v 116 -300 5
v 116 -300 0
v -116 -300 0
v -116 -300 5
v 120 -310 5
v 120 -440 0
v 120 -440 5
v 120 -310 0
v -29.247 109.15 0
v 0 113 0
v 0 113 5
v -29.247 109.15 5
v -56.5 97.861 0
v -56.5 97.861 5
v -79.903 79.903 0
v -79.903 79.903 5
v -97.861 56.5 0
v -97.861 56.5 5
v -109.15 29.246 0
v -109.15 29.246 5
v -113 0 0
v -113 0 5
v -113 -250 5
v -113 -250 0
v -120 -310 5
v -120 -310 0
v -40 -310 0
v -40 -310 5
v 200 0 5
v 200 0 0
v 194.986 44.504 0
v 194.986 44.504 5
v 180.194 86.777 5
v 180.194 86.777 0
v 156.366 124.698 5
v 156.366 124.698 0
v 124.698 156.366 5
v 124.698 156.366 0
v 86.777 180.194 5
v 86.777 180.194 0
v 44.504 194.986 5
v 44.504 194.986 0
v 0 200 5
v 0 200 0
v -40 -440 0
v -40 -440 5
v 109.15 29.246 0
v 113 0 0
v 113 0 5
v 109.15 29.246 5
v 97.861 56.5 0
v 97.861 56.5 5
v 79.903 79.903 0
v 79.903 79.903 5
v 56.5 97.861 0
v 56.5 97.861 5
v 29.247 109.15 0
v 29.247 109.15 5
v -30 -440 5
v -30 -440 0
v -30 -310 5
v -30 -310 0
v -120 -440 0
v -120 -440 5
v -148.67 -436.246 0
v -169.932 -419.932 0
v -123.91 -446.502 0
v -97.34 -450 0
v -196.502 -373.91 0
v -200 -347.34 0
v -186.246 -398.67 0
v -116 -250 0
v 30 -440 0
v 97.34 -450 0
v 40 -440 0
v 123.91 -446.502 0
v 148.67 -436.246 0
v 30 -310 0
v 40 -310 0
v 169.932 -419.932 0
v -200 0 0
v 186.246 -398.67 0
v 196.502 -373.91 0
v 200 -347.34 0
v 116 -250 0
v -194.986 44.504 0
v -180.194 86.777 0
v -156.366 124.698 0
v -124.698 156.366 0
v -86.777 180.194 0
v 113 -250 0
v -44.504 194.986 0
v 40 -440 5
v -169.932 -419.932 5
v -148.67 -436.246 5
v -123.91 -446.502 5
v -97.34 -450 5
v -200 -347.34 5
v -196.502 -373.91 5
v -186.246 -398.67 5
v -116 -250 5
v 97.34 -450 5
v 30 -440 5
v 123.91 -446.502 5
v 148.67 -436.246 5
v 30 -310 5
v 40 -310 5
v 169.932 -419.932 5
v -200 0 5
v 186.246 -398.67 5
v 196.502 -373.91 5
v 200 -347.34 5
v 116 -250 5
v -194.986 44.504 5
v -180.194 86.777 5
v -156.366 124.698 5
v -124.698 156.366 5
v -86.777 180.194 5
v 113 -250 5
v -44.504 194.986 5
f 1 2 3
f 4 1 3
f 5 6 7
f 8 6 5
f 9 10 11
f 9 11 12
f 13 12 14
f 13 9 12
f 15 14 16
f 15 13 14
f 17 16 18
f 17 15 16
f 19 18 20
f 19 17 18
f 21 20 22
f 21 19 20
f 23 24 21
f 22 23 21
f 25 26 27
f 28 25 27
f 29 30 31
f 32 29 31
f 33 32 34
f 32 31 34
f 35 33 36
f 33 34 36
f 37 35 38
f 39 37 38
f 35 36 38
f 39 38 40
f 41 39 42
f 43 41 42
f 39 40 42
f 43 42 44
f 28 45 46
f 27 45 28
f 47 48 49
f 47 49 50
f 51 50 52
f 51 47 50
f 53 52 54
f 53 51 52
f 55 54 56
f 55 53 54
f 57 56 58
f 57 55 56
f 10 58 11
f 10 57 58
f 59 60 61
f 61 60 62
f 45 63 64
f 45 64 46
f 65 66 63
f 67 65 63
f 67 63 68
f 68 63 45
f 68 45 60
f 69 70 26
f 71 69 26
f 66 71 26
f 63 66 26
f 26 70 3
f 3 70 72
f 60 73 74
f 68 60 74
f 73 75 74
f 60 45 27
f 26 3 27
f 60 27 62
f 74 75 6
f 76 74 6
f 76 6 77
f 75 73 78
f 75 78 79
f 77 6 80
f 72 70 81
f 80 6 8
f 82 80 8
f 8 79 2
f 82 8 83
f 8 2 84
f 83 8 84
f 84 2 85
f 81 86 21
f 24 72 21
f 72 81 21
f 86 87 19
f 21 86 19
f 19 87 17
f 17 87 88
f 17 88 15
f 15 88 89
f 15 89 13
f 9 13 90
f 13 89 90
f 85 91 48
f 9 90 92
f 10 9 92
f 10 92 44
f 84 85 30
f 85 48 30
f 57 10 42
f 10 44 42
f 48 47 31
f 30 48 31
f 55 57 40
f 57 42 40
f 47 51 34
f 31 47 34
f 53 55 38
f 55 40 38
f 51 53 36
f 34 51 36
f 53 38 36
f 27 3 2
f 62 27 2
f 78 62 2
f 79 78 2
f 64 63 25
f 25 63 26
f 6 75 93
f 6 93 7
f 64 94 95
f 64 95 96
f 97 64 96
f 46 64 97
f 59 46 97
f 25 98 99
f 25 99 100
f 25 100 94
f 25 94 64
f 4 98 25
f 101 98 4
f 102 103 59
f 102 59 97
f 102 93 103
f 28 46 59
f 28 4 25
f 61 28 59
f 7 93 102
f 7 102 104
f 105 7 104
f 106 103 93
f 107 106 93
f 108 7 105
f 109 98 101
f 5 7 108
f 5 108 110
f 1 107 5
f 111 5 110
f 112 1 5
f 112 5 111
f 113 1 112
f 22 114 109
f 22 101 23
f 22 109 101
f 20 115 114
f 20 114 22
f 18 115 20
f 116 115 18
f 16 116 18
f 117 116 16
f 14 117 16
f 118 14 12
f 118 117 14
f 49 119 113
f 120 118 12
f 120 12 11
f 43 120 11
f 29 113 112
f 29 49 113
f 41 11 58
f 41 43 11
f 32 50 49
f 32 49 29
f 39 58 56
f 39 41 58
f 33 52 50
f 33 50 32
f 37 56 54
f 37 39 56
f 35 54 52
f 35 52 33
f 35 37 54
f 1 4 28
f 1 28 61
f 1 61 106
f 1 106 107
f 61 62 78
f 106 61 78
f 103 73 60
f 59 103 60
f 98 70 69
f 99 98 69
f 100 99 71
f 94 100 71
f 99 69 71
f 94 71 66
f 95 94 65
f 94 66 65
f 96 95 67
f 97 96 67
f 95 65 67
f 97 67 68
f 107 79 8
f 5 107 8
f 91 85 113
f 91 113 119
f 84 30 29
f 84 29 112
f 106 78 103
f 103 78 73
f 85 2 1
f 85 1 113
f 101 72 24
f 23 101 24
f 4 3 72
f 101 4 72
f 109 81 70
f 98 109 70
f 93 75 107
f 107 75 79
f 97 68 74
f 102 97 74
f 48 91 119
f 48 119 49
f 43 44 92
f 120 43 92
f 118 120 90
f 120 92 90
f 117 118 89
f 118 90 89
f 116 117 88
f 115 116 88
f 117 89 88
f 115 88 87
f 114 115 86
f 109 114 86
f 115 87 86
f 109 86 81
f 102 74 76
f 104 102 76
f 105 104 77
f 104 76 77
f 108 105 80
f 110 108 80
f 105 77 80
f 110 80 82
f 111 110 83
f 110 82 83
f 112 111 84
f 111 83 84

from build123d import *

# Parameters (mm, degrees)
SKETCH_W  = 80
SKETCH_H  = 130
PAD_DEPTH = 5


with BuildPart() as part:
    # Sketch → Pad (new body)
    with BuildSketch(Plane.XY):
        with BuildLine():
            ThreePointArc((200, 3e-06), (141.421355, 141.421357), (0, 200))
            ThreePointArc((0, 200), (-141.421355, 141.421357), (-200, 3e-06))
            Line((-200, 3e-06), (-200, -347.34))
            ThreePointArc((-200, -347.34), (-169.931582, -419.931582), (-97.340001, -450))
            Line((0, -450), (-97.340001, -450))
            Line((0, -450), (97.340001, -450))
            ThreePointArc((97.340001, -450), (169.931582, -419.931582), (200, -347.34))
            Line((200, 3e-06), (200, -347.34))
        make_face()
        with BuildLine():
            Line((0, -300), (116, -300))
            Line((116, -300), (116, -250))
            Line((116, -250), (113, -250))
            Line((113, -250), (113, -0.000123))
            ThreePointArc((113, -0.000123), (79.90311, 79.903023), (0, 113))
            ThreePointArc((0, 113), (-79.90311, 79.903023), (-113, -0.000123))
            Line((-113, -250), (-113, -0.000123))
            Line((-116, -250), (-113, -250))
            Line((-116, -300), (-116, -250))
            Line((0, -300), (-116, -300))
        make_face(mode=Mode.SUBTRACT)
        with Locations((80, -375)):
            Rectangle(SKETCH_W, SKETCH_H, mode=Mode.SUBTRACT)
        Polygon((0, -310), (30, -310), (30, -440), (0, -440), (-30, -440), (-30, -310), align=None, mode=Mode.SUBTRACT)
        with Locations((-80, -375)):
            Rectangle(SKETCH_W, SKETCH_H, mode=Mode.SUBTRACT)
    extrude(amount=PAD_DEPTH)


solid = part.part
